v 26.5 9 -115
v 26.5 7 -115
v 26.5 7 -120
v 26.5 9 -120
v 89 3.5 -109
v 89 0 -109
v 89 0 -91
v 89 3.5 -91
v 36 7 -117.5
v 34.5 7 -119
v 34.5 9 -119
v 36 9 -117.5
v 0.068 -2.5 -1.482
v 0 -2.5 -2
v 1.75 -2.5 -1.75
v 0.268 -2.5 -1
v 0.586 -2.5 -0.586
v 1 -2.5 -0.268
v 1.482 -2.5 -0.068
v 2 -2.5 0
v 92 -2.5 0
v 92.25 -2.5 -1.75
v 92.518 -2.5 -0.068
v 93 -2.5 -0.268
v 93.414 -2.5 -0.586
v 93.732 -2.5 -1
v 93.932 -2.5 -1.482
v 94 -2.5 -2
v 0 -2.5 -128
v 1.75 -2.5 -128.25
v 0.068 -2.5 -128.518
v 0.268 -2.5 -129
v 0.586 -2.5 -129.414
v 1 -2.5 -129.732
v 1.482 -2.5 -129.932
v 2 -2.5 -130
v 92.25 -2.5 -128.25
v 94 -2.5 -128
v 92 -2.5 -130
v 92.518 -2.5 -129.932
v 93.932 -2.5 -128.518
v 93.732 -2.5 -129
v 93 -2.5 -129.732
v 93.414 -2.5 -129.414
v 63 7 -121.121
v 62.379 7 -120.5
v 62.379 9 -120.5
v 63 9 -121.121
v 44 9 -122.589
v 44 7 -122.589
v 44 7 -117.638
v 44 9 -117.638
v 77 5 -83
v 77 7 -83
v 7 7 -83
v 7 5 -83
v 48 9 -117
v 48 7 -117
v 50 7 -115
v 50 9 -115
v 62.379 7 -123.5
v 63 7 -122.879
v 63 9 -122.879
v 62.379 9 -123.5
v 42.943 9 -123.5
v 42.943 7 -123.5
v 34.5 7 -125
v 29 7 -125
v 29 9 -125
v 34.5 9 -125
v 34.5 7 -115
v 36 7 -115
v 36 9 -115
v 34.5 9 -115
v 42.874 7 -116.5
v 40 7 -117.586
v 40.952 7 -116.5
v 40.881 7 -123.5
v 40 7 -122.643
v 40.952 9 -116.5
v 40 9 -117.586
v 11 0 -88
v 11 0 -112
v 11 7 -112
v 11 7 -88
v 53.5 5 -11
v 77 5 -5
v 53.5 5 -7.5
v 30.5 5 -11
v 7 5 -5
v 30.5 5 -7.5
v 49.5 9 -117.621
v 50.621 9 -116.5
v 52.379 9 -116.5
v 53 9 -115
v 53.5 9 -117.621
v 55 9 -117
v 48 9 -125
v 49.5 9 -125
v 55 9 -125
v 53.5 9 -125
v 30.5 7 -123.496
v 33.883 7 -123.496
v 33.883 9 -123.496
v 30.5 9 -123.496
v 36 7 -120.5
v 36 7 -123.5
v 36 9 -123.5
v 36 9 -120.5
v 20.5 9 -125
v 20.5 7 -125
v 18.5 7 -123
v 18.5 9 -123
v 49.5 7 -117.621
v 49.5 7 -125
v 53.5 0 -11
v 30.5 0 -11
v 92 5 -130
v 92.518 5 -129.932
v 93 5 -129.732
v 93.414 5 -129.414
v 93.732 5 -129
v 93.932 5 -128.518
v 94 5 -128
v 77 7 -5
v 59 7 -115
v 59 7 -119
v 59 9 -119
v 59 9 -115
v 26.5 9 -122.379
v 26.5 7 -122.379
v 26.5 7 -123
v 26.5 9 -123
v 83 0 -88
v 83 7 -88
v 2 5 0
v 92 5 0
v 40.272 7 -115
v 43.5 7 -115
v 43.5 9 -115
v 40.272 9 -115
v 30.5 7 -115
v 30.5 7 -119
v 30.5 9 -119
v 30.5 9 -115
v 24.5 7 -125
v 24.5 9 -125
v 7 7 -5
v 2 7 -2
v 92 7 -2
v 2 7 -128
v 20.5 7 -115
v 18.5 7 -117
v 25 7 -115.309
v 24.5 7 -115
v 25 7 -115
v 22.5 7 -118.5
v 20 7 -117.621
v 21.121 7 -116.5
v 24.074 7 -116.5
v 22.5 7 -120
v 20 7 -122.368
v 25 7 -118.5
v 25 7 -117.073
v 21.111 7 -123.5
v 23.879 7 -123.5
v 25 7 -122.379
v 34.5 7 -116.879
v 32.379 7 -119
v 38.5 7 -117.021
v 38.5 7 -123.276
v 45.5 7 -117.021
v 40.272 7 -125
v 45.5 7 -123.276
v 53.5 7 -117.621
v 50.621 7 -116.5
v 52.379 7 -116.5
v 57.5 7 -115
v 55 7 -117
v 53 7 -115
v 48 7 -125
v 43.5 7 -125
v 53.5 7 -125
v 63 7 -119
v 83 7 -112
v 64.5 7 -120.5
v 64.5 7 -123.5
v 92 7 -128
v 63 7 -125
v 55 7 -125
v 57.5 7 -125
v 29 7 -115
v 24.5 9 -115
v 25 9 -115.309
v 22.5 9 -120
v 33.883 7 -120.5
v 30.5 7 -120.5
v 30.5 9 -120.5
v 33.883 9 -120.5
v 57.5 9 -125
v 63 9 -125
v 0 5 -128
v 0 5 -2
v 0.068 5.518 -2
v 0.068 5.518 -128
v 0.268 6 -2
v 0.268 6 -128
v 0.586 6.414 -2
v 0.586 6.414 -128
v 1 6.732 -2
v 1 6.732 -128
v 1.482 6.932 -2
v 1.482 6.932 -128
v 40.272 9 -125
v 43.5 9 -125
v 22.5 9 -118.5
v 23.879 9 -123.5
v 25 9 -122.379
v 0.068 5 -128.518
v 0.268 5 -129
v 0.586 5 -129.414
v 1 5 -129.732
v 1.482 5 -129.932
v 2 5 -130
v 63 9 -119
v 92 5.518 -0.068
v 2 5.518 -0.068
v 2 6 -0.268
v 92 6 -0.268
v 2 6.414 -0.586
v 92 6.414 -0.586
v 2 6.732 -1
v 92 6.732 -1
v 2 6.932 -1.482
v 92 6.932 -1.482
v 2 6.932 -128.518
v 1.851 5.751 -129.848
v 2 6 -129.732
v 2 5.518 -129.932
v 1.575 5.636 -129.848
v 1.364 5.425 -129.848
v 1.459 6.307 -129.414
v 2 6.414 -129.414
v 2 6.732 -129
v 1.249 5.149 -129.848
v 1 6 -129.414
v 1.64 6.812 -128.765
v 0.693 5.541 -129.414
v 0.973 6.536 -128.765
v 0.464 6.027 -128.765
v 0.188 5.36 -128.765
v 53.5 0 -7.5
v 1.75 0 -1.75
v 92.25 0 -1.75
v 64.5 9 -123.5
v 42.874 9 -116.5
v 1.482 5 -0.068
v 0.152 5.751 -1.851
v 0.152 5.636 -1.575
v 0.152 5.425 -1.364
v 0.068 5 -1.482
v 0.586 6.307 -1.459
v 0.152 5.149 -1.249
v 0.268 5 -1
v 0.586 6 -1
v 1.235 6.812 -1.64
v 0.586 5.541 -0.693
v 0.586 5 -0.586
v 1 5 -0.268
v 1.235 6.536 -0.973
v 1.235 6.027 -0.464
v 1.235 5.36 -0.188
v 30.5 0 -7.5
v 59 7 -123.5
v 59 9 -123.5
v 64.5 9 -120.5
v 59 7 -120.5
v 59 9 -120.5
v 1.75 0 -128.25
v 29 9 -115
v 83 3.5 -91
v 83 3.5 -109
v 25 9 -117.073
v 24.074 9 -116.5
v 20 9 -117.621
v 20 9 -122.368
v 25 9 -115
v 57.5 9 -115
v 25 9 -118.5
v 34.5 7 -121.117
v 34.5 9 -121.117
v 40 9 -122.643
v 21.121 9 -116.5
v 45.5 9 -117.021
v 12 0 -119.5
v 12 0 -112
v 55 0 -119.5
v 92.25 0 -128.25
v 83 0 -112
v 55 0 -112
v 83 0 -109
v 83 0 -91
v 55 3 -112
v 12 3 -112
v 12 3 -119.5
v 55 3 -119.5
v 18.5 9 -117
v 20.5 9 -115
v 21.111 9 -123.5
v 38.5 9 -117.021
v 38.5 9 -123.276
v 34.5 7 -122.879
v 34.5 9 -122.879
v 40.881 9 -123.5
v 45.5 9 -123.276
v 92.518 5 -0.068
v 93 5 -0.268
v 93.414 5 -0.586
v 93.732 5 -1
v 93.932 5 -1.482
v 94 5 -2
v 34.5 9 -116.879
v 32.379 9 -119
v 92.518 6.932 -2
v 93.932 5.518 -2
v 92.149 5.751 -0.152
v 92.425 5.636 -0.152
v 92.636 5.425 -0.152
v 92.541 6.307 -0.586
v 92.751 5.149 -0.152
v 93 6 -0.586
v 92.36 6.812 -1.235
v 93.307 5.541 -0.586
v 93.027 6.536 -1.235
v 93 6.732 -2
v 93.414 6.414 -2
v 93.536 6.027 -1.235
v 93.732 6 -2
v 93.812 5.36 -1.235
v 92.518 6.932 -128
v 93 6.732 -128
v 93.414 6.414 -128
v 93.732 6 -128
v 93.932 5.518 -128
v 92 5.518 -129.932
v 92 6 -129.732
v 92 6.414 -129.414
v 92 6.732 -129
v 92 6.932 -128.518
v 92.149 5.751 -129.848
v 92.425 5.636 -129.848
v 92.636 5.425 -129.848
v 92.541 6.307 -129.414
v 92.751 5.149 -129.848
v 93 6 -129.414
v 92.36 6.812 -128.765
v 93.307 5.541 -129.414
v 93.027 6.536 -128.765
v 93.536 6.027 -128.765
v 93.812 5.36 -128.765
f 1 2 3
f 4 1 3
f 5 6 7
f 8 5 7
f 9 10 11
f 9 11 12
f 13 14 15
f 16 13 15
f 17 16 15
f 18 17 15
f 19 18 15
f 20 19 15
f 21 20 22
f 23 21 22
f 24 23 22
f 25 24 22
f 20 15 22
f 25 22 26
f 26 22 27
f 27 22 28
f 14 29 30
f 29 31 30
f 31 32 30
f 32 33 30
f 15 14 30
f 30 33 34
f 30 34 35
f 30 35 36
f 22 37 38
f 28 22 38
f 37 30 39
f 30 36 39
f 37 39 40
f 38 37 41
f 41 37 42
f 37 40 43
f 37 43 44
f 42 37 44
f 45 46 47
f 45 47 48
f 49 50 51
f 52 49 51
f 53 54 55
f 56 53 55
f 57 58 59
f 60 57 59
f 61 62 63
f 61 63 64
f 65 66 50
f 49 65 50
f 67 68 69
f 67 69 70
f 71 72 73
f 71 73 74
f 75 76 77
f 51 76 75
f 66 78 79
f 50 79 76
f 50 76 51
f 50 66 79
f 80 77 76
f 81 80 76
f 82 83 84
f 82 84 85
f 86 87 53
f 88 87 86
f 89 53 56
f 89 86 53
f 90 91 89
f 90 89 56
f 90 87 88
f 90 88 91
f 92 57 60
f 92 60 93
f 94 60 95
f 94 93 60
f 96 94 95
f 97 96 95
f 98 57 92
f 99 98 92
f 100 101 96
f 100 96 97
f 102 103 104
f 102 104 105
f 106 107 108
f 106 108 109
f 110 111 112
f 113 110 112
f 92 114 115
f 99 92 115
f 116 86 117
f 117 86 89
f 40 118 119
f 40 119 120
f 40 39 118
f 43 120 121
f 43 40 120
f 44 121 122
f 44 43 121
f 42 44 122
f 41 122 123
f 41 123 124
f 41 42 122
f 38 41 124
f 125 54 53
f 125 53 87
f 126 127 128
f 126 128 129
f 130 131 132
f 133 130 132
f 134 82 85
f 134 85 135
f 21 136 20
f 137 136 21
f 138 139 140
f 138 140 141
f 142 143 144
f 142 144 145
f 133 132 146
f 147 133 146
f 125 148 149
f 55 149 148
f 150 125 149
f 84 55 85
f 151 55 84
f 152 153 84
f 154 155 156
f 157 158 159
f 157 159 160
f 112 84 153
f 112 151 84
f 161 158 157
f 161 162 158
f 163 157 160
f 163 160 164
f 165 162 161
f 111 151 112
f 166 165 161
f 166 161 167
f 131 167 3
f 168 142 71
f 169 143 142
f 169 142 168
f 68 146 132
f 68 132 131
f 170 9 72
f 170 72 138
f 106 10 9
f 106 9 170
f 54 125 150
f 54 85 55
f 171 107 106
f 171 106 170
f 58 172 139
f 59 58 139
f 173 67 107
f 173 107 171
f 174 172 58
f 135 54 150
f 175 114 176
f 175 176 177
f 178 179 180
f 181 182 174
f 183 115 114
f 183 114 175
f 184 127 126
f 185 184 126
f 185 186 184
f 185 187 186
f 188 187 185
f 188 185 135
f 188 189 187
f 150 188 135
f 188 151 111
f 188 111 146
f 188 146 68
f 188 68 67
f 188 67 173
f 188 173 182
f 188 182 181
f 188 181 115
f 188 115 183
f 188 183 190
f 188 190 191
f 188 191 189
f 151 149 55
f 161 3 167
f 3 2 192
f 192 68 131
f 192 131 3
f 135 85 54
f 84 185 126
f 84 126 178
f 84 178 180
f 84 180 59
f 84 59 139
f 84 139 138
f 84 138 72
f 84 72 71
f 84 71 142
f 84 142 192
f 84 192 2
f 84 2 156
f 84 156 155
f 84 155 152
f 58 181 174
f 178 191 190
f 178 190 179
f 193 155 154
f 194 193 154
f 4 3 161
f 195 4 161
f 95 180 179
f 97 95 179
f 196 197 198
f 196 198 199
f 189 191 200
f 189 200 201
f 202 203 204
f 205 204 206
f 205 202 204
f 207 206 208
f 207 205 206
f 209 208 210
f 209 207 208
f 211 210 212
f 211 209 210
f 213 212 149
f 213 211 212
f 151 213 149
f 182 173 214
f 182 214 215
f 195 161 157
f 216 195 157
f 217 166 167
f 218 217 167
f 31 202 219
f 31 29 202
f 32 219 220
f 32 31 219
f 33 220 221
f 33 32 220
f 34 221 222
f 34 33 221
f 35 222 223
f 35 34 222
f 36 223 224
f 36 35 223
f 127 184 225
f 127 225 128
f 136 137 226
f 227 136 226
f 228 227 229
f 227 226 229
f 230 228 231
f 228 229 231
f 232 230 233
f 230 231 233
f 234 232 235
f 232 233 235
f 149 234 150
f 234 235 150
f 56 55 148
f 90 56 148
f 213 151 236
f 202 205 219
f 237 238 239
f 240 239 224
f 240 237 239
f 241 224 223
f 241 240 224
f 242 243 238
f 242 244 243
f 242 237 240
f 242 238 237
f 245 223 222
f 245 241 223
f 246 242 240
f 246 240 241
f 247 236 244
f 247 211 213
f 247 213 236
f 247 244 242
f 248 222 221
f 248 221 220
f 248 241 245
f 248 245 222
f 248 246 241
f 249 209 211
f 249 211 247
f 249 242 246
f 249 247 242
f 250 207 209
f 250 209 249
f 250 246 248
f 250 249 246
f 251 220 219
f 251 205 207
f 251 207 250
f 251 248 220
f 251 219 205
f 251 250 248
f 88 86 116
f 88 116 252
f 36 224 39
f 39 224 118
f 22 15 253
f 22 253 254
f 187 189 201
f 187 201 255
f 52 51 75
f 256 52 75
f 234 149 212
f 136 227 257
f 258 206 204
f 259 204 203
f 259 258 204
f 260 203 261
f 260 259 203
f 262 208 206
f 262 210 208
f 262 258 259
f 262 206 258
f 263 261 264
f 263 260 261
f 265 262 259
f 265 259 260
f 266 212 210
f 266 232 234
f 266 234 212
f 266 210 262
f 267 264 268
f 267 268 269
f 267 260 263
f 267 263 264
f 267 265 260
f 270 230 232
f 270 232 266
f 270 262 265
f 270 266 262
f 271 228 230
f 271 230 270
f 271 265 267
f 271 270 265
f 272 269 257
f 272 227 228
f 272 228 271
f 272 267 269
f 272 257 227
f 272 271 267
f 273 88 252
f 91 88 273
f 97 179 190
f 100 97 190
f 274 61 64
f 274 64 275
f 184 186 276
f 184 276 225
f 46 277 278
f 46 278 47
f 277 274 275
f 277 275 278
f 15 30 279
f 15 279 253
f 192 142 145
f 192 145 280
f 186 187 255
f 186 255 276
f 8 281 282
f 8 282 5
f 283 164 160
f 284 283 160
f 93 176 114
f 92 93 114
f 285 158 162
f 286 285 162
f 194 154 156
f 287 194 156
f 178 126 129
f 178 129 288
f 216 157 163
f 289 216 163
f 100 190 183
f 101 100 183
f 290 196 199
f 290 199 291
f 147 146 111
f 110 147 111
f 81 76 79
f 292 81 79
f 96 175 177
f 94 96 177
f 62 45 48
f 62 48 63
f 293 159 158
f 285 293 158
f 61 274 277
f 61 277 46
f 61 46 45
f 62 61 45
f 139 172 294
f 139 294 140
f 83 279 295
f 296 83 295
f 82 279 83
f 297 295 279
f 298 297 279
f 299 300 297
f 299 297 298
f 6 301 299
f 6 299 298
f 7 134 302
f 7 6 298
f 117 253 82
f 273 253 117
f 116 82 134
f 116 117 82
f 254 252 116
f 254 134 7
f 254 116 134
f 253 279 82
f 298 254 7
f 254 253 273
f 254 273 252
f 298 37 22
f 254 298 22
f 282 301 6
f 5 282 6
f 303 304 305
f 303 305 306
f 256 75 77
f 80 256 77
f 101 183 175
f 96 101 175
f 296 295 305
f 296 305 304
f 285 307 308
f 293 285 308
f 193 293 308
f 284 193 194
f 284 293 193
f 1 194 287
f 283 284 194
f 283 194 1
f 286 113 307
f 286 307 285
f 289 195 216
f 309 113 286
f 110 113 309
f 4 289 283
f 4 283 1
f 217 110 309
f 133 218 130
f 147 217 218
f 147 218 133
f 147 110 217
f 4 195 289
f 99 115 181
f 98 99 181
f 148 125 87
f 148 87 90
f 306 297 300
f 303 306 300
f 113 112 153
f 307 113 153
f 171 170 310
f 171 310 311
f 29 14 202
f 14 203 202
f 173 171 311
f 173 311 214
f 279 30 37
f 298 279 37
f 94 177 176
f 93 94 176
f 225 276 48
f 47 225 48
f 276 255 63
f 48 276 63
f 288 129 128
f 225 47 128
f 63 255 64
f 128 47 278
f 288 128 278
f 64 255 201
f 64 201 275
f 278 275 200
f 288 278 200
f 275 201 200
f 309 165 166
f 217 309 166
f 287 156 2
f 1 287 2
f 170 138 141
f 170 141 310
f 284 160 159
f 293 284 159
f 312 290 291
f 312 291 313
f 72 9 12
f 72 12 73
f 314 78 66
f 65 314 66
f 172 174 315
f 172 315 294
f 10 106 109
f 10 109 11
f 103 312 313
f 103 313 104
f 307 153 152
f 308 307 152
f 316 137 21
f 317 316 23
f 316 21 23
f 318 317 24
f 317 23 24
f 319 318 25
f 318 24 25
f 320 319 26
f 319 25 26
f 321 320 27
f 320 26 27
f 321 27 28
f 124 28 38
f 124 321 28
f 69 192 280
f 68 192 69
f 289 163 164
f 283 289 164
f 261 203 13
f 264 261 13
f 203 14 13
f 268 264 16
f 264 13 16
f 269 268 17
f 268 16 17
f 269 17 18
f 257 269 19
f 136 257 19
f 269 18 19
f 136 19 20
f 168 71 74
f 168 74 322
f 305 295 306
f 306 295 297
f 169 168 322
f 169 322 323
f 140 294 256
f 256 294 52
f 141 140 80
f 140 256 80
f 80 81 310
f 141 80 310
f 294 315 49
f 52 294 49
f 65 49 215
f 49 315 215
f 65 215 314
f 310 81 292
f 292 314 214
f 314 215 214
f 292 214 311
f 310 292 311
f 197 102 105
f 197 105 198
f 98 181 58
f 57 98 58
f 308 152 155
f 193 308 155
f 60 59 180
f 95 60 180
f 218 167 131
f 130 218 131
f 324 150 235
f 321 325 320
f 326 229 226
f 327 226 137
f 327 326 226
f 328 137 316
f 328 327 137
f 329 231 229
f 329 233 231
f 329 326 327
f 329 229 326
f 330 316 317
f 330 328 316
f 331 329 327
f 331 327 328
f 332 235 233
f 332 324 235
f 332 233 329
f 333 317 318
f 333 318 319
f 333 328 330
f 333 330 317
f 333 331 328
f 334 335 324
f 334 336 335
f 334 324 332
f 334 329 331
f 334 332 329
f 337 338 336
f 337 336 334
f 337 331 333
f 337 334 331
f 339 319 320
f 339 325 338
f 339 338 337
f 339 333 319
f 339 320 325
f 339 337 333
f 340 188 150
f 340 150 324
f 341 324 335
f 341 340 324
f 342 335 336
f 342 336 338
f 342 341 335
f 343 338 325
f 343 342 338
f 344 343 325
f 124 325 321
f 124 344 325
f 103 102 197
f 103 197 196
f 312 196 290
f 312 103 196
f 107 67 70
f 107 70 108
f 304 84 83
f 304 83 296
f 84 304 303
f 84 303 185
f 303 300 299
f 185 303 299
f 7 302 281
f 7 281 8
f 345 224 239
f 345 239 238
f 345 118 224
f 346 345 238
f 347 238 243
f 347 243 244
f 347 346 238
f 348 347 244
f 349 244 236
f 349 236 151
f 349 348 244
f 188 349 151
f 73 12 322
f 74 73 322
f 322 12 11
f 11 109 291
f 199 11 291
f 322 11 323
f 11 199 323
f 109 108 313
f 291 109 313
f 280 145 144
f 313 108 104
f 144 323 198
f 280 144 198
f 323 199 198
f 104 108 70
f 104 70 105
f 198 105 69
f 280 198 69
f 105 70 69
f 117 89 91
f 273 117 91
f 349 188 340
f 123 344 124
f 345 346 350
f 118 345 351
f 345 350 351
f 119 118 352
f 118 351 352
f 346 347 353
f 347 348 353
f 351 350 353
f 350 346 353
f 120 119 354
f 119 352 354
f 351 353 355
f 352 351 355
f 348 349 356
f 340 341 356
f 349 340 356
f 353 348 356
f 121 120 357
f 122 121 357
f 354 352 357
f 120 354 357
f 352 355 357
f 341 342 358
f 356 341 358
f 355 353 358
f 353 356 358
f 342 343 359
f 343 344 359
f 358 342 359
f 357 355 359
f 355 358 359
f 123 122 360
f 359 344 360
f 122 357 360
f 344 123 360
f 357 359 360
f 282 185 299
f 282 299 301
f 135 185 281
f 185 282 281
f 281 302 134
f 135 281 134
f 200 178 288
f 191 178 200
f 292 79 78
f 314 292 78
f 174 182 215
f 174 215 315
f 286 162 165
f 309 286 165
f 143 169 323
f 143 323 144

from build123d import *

# Parameters (mm, degrees)
SKETCH1_W           = 94
SKETCH1_H           = 130
BOSS_EXTRUDE1_DEPTH = 9.5
SKETCH2_W           = 90.5
SKETCH2_H           = 126.5
CUT_EXTRUDE1_DEPTH  = 2.5
SKETCH3_W           = 72
SKETCH3_H           = 24
CUT_EXTRUDE2_DEPTH  = 8
SKETCH4_W           = 70
SKETCH4_H           = 78
CUT_EXTRUDE3_DEPTH  = 2
SKETCH5_W           = 23
SKETCH5_H           = 3.5
CUT_EXTRUDE4_DEPTH  = 8.5
SKETCH6_W           = 6
SKETCH6_H           = 18
CUT_EXTRUDE5_DEPTH  = 3.5
SKETCH7_W           = 43
SKETCH7_H           = 7.5
CUT_EXTRUDE6_DEPTH  = 3
FILLET1_R           = 2
BOSS_EXTRUDE3_DEPTH = 2


with BuildPart() as part:
    # Sketch1 → Boss-Extrude1 (new body)
    with BuildSketch(Plane(origin=(0, 7, 0), x_dir=(1, 0, 0), z_dir=(0, 1, 0))):
        with Locations((47, 65)):
            Rectangle(SKETCH1_W, SKETCH1_H)
    extrude(amount=-BOSS_EXTRUDE1_DEPTH)

    # Sketch2 → Cut-Extrude1 (cut)
    with BuildSketch(Plane.XZ.offset(2.5)):
        with Locations((47, -65)):
            Rectangle(SKETCH2_W, SKETCH2_H)
    extrude(amount=-CUT_EXTRUDE1_DEPTH, mode=Mode.SUBTRACT)

    # Sketch3 → Cut-Extrude2 (cut, through all)
    with BuildSketch(Plane.XZ):
        with Locations((47, -100)):
            Rectangle(SKETCH3_W, SKETCH3_H)
    extrude(amount=-CUT_EXTRUDE2_DEPTH, mode=Mode.SUBTRACT)

    # Sketch4 → Cut-Extrude3 (cut)
    with BuildSketch(Plane(origin=(0, 7, 0), x_dir=(-1, 0, 0), z_dir=(0, 1, 0))):
        with Locations((-42, -44)):
            Rectangle(SKETCH4_W, SKETCH4_H)
    extrude(amount=-CUT_EXTRUDE3_DEPTH, mode=Mode.SUBTRACT)

    # Sketch5 → Cut-Extrude4 (cut, through all)
    with BuildSketch(Plane(origin=(0, 5, 0), x_dir=(-1, 0, 0), z_dir=(0, 1, 0))):
        with Locations((-42, -9.25)):
            Rectangle(SKETCH5_W, SKETCH5_H)
    extrude(amount=-CUT_EXTRUDE4_DEPTH, mode=Mode.SUBTRACT)

    # Sketch6 → Cut-Extrude5 (cut)
    with BuildSketch(Plane.XZ):
        with Locations((86, -100)):
            Rectangle(SKETCH6_W, SKETCH6_H)
    extrude(amount=-CUT_EXTRUDE5_DEPTH, mode=Mode.SUBTRACT)

    # Sketch7 → Cut-Extrude6 (cut)
    with BuildSketch(Plane.XZ):
        with Locations((33.5, -115.75)):
            Rectangle(SKETCH7_W, SKETCH7_H)
    extrude(amount=-CUT_EXTRUDE6_DEPTH, mode=Mode.SUBTRACT)

    # Fillet1
    fillet1_edges = [part.edges().sort_by_distance(p)[0] for p in [
        (94, 7, -65),
        (47, 7, 0),
        (0, 7, -65),
        (47, 7, -130),
        (94, 2.25, -130),
        (94, 2.25, 0),
        (0, 2.25, 0),
        (0, 2.25, -130),
    ]]
    fillet(fillet1_edges, radius=FILLET1_R)

    # Sketch10 → Boss-Extrude3 (add)
    with BuildSketch(Plane(origin=(0, 7, 0), x_dir=(1, 0, 0), z_dir=(0, 1, 0))):
        Polygon((26.5, 123), (24.5, 125), (20.5, 125), (18.5, 123), (18.5, 117), (20.5, 115), (24.5, 115), (25, 115.309128344), (25, 115), (26.5, 115), (26.5, 120), (22.5, 120), (22.5, 118.5), (25, 118.5), (25, 117.072659745), (24.07375083, 116.5), (21.121320344, 116.5), (20, 117.621320344), (20, 122.367836714), (21.110870681, 123.5), (23.878679656, 123.5), (25, 122.378679656), (26.5, 122.378679656), align=None)
        Polygon((32.378679656, 119), (30.5, 119), (30.5, 115), (29, 115), (29, 125), (34.5, 125), (36, 123.5), (36, 120.5), (34.5, 119), (36, 117.5), (36, 115), (34.5, 115), (34.5, 116.878679656), align=None)
        Polygon((30.5, 123.496173662), (30.5, 120.5), (33.882505994, 120.5), (34.5, 121.117494006), (34.5, 122.878679656), (33.882505994, 123.496173662), align=None, mode=Mode.SUBTRACT)
        Polygon((43.5, 125), (45.5, 123.276052985), (45.5, 117.021376869), (43.5, 115), (40.272028005, 115), (38.5, 117.021376869), (38.5, 123.276052985), (40.272028005, 125), align=None)
        Polygon((42.942743976, 123.5), (44, 122.588673317), (44, 117.638031489), (42.874003649, 116.5), (40.951839055, 116.5), (40, 117.585775983), (40, 122.642614002), (40.881298547, 123.5), align=None, mode=Mode.SUBTRACT)
        Polygon((48, 117), (50, 115), (53, 115), (55, 117), (55, 125), (53.5, 125), (53.5, 123.5), (53.5, 117.621320344), (52.378679656, 116.5), (50.621320344, 116.5), (49.5, 117.621320344), (49.5, 123.5), (49.5, 125), (48, 125), align=None)
        Polygon((63, 119), (59, 119), (59, 115), (57.5, 115), (57.5, 125), (63, 125), (64.5, 123.5), (64.5, 120.5), align=None)
        Polygon((59, 123.5), (59, 120.5), (62.378679656, 120.5), (63, 121.121320344), (63, 122.878679656), (62.378679656, 123.5), align=None, mode=Mode.SUBTRACT)
    extrude(amount=BOSS_EXTRUDE3_DEPTH)


solid = part.part
